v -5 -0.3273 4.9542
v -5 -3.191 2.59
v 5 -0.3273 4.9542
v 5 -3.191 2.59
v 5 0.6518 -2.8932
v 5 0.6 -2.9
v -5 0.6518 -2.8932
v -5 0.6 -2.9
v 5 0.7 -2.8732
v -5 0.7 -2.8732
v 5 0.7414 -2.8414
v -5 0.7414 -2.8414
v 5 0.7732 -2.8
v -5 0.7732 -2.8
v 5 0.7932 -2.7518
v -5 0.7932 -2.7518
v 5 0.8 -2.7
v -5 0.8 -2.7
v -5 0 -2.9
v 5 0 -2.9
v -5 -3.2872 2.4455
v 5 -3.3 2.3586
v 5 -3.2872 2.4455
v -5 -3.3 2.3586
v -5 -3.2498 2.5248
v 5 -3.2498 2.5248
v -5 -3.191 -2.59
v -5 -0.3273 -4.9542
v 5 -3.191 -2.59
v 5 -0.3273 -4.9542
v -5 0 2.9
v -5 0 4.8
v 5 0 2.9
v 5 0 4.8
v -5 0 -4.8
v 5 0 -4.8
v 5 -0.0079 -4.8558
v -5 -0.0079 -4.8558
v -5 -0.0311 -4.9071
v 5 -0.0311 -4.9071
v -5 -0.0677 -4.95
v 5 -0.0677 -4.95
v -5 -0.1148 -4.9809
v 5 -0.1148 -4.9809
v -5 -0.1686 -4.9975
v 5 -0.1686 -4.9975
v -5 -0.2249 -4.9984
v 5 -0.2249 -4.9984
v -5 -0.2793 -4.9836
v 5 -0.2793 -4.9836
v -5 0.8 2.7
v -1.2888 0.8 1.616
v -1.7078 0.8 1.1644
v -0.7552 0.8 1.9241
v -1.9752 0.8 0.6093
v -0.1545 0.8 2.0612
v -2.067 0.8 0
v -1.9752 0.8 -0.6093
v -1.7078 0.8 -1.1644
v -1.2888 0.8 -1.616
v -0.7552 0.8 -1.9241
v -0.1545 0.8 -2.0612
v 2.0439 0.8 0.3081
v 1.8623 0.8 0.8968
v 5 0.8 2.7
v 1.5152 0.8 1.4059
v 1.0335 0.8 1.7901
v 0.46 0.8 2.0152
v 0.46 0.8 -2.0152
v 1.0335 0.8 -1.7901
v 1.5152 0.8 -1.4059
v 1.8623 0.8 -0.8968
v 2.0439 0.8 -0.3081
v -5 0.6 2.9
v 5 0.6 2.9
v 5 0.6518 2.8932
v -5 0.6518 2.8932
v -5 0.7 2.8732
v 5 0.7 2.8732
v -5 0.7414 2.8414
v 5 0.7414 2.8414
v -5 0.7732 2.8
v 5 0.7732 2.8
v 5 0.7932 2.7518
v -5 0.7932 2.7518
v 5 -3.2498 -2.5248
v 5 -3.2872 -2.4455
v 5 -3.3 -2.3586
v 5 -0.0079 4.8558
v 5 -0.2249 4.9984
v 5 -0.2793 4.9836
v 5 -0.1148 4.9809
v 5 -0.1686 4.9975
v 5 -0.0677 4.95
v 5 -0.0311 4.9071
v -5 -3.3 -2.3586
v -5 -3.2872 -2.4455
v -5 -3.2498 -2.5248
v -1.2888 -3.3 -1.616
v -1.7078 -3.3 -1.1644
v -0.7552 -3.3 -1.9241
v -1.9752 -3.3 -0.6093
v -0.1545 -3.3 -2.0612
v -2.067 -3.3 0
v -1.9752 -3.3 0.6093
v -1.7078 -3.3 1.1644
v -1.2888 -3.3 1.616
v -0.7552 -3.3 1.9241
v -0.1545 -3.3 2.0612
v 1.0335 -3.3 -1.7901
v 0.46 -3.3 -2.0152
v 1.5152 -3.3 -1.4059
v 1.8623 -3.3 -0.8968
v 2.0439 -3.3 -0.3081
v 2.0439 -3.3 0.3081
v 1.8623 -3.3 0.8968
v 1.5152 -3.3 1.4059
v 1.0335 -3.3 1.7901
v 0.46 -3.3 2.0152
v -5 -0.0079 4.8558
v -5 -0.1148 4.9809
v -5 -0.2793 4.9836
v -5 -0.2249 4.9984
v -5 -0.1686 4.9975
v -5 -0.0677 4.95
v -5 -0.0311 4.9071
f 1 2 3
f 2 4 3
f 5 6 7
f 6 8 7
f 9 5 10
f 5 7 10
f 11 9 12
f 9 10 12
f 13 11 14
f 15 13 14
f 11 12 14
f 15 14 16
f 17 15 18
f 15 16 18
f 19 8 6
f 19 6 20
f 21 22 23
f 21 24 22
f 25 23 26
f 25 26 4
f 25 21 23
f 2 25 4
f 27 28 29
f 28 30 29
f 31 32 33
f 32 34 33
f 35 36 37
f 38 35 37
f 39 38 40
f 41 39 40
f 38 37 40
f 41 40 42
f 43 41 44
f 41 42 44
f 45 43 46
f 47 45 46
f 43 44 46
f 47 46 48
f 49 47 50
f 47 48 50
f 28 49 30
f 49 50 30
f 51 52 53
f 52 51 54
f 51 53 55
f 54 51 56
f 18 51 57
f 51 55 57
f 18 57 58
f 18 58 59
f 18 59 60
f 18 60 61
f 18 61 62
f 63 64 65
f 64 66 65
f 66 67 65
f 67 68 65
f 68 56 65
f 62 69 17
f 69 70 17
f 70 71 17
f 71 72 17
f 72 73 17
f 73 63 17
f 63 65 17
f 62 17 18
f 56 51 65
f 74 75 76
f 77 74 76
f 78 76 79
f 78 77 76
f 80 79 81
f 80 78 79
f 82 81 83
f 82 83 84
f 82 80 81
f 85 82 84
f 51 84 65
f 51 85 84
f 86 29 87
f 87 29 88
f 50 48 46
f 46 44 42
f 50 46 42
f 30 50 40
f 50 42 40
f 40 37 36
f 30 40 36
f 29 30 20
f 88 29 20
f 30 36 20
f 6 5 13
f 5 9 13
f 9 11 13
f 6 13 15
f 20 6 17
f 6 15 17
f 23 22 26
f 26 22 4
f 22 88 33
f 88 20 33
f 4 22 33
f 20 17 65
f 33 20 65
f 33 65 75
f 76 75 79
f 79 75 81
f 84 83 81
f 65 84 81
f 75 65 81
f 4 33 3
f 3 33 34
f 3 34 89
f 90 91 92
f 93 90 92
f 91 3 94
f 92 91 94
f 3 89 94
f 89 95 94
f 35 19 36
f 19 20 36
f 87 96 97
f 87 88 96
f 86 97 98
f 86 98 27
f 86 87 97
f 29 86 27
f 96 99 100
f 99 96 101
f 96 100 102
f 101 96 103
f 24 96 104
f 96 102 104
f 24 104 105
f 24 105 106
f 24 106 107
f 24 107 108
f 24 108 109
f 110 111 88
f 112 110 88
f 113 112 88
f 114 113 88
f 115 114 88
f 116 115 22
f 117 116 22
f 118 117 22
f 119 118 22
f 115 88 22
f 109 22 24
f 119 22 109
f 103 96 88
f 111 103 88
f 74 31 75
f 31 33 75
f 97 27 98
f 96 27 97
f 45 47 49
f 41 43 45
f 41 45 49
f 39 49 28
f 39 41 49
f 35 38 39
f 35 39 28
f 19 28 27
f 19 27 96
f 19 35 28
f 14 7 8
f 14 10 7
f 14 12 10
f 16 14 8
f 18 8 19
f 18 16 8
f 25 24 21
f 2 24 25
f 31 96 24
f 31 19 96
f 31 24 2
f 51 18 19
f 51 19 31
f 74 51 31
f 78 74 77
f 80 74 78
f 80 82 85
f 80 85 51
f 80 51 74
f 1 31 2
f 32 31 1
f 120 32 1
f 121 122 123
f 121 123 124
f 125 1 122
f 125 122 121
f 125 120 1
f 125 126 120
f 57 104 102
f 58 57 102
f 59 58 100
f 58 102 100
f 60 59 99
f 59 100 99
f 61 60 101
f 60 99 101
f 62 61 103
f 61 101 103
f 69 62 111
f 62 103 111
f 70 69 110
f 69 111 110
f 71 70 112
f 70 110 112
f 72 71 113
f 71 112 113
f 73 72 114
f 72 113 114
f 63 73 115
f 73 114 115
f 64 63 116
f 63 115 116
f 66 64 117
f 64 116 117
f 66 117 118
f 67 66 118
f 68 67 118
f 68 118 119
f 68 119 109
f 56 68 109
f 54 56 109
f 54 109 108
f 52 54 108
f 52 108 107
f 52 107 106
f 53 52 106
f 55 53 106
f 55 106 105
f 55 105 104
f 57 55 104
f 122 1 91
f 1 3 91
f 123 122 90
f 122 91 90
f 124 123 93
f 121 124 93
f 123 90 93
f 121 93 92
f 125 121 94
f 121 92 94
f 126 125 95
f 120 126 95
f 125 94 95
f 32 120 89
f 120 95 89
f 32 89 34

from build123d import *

# Parameters (mm, degrees)
BOSS_EXTRUDE1_DEPTH = 5
FILLET1_R           = 0.3
FILLET2_R           = 0.2
TAPPED_HOLE1_D      = 4.134


with BuildPart() as part:
    # Sketch1 → Boss-Extrude1 (new, symmetric)
    with BuildSketch(Plane(origin=(0, 0, 0), x_dir=(0, 0, -1), z_dir=(1, 0, 0))):
        with BuildLine():
            Line((2.5, -3.3), (-2.5, -3.3))
            Line((-2.5, -3.3), (-4.954229367, -0.327331466))
            ThreePointArc((-4.954229367, -0.327331466), (-4.980923041, -0.114754159), (-4.8, 0))
            Line((-4.8, 0), (-2.9, 0))
            Line((-2.9, 0), (-2.9, 0.8))
            Line((-2.9, 0.8), (2.9, 0.8))
            Line((2.9, 0.8), (2.9, 0))
            Line((2.9, 0), (4.8, 0))
            ThreePointArc((4.8, 0), (4.980923041, -0.114754159), (4.954229367, -0.327331466))
            Line((4.954229367, -0.327331466), (2.5, -3.3))
        make_face()
    extrude(amount=BOSS_EXTRUDE1_DEPTH, both=True)

    # Fillet1
    fillet1_edges = [part.edges().sort_by_distance(p)[0] for p in [
        (0, -3.3, -2.5),
        (0, -3.3, 2.5),
    ]]
    fillet(fillet1_edges, radius=FILLET1_R)

    # Fillet2
    fillet2_edges = [part.edges().sort_by_distance(p)[0] for p in [
        (0, 0.8, 2.9),
        (0, 0.8, -2.9),
    ]]
    fillet(fillet2_edges, radius=FILLET2_R)

    # Tapped Hole1 (through all)
    with Locations(Plane(origin=(0, 0.8, 0), x_dir=(1, 0, 0), z_dir=(0, 1, 0))):
        with Locations((0, 0)):
            Hole(TAPPED_HOLE1_D / 2)


solid = part.part
